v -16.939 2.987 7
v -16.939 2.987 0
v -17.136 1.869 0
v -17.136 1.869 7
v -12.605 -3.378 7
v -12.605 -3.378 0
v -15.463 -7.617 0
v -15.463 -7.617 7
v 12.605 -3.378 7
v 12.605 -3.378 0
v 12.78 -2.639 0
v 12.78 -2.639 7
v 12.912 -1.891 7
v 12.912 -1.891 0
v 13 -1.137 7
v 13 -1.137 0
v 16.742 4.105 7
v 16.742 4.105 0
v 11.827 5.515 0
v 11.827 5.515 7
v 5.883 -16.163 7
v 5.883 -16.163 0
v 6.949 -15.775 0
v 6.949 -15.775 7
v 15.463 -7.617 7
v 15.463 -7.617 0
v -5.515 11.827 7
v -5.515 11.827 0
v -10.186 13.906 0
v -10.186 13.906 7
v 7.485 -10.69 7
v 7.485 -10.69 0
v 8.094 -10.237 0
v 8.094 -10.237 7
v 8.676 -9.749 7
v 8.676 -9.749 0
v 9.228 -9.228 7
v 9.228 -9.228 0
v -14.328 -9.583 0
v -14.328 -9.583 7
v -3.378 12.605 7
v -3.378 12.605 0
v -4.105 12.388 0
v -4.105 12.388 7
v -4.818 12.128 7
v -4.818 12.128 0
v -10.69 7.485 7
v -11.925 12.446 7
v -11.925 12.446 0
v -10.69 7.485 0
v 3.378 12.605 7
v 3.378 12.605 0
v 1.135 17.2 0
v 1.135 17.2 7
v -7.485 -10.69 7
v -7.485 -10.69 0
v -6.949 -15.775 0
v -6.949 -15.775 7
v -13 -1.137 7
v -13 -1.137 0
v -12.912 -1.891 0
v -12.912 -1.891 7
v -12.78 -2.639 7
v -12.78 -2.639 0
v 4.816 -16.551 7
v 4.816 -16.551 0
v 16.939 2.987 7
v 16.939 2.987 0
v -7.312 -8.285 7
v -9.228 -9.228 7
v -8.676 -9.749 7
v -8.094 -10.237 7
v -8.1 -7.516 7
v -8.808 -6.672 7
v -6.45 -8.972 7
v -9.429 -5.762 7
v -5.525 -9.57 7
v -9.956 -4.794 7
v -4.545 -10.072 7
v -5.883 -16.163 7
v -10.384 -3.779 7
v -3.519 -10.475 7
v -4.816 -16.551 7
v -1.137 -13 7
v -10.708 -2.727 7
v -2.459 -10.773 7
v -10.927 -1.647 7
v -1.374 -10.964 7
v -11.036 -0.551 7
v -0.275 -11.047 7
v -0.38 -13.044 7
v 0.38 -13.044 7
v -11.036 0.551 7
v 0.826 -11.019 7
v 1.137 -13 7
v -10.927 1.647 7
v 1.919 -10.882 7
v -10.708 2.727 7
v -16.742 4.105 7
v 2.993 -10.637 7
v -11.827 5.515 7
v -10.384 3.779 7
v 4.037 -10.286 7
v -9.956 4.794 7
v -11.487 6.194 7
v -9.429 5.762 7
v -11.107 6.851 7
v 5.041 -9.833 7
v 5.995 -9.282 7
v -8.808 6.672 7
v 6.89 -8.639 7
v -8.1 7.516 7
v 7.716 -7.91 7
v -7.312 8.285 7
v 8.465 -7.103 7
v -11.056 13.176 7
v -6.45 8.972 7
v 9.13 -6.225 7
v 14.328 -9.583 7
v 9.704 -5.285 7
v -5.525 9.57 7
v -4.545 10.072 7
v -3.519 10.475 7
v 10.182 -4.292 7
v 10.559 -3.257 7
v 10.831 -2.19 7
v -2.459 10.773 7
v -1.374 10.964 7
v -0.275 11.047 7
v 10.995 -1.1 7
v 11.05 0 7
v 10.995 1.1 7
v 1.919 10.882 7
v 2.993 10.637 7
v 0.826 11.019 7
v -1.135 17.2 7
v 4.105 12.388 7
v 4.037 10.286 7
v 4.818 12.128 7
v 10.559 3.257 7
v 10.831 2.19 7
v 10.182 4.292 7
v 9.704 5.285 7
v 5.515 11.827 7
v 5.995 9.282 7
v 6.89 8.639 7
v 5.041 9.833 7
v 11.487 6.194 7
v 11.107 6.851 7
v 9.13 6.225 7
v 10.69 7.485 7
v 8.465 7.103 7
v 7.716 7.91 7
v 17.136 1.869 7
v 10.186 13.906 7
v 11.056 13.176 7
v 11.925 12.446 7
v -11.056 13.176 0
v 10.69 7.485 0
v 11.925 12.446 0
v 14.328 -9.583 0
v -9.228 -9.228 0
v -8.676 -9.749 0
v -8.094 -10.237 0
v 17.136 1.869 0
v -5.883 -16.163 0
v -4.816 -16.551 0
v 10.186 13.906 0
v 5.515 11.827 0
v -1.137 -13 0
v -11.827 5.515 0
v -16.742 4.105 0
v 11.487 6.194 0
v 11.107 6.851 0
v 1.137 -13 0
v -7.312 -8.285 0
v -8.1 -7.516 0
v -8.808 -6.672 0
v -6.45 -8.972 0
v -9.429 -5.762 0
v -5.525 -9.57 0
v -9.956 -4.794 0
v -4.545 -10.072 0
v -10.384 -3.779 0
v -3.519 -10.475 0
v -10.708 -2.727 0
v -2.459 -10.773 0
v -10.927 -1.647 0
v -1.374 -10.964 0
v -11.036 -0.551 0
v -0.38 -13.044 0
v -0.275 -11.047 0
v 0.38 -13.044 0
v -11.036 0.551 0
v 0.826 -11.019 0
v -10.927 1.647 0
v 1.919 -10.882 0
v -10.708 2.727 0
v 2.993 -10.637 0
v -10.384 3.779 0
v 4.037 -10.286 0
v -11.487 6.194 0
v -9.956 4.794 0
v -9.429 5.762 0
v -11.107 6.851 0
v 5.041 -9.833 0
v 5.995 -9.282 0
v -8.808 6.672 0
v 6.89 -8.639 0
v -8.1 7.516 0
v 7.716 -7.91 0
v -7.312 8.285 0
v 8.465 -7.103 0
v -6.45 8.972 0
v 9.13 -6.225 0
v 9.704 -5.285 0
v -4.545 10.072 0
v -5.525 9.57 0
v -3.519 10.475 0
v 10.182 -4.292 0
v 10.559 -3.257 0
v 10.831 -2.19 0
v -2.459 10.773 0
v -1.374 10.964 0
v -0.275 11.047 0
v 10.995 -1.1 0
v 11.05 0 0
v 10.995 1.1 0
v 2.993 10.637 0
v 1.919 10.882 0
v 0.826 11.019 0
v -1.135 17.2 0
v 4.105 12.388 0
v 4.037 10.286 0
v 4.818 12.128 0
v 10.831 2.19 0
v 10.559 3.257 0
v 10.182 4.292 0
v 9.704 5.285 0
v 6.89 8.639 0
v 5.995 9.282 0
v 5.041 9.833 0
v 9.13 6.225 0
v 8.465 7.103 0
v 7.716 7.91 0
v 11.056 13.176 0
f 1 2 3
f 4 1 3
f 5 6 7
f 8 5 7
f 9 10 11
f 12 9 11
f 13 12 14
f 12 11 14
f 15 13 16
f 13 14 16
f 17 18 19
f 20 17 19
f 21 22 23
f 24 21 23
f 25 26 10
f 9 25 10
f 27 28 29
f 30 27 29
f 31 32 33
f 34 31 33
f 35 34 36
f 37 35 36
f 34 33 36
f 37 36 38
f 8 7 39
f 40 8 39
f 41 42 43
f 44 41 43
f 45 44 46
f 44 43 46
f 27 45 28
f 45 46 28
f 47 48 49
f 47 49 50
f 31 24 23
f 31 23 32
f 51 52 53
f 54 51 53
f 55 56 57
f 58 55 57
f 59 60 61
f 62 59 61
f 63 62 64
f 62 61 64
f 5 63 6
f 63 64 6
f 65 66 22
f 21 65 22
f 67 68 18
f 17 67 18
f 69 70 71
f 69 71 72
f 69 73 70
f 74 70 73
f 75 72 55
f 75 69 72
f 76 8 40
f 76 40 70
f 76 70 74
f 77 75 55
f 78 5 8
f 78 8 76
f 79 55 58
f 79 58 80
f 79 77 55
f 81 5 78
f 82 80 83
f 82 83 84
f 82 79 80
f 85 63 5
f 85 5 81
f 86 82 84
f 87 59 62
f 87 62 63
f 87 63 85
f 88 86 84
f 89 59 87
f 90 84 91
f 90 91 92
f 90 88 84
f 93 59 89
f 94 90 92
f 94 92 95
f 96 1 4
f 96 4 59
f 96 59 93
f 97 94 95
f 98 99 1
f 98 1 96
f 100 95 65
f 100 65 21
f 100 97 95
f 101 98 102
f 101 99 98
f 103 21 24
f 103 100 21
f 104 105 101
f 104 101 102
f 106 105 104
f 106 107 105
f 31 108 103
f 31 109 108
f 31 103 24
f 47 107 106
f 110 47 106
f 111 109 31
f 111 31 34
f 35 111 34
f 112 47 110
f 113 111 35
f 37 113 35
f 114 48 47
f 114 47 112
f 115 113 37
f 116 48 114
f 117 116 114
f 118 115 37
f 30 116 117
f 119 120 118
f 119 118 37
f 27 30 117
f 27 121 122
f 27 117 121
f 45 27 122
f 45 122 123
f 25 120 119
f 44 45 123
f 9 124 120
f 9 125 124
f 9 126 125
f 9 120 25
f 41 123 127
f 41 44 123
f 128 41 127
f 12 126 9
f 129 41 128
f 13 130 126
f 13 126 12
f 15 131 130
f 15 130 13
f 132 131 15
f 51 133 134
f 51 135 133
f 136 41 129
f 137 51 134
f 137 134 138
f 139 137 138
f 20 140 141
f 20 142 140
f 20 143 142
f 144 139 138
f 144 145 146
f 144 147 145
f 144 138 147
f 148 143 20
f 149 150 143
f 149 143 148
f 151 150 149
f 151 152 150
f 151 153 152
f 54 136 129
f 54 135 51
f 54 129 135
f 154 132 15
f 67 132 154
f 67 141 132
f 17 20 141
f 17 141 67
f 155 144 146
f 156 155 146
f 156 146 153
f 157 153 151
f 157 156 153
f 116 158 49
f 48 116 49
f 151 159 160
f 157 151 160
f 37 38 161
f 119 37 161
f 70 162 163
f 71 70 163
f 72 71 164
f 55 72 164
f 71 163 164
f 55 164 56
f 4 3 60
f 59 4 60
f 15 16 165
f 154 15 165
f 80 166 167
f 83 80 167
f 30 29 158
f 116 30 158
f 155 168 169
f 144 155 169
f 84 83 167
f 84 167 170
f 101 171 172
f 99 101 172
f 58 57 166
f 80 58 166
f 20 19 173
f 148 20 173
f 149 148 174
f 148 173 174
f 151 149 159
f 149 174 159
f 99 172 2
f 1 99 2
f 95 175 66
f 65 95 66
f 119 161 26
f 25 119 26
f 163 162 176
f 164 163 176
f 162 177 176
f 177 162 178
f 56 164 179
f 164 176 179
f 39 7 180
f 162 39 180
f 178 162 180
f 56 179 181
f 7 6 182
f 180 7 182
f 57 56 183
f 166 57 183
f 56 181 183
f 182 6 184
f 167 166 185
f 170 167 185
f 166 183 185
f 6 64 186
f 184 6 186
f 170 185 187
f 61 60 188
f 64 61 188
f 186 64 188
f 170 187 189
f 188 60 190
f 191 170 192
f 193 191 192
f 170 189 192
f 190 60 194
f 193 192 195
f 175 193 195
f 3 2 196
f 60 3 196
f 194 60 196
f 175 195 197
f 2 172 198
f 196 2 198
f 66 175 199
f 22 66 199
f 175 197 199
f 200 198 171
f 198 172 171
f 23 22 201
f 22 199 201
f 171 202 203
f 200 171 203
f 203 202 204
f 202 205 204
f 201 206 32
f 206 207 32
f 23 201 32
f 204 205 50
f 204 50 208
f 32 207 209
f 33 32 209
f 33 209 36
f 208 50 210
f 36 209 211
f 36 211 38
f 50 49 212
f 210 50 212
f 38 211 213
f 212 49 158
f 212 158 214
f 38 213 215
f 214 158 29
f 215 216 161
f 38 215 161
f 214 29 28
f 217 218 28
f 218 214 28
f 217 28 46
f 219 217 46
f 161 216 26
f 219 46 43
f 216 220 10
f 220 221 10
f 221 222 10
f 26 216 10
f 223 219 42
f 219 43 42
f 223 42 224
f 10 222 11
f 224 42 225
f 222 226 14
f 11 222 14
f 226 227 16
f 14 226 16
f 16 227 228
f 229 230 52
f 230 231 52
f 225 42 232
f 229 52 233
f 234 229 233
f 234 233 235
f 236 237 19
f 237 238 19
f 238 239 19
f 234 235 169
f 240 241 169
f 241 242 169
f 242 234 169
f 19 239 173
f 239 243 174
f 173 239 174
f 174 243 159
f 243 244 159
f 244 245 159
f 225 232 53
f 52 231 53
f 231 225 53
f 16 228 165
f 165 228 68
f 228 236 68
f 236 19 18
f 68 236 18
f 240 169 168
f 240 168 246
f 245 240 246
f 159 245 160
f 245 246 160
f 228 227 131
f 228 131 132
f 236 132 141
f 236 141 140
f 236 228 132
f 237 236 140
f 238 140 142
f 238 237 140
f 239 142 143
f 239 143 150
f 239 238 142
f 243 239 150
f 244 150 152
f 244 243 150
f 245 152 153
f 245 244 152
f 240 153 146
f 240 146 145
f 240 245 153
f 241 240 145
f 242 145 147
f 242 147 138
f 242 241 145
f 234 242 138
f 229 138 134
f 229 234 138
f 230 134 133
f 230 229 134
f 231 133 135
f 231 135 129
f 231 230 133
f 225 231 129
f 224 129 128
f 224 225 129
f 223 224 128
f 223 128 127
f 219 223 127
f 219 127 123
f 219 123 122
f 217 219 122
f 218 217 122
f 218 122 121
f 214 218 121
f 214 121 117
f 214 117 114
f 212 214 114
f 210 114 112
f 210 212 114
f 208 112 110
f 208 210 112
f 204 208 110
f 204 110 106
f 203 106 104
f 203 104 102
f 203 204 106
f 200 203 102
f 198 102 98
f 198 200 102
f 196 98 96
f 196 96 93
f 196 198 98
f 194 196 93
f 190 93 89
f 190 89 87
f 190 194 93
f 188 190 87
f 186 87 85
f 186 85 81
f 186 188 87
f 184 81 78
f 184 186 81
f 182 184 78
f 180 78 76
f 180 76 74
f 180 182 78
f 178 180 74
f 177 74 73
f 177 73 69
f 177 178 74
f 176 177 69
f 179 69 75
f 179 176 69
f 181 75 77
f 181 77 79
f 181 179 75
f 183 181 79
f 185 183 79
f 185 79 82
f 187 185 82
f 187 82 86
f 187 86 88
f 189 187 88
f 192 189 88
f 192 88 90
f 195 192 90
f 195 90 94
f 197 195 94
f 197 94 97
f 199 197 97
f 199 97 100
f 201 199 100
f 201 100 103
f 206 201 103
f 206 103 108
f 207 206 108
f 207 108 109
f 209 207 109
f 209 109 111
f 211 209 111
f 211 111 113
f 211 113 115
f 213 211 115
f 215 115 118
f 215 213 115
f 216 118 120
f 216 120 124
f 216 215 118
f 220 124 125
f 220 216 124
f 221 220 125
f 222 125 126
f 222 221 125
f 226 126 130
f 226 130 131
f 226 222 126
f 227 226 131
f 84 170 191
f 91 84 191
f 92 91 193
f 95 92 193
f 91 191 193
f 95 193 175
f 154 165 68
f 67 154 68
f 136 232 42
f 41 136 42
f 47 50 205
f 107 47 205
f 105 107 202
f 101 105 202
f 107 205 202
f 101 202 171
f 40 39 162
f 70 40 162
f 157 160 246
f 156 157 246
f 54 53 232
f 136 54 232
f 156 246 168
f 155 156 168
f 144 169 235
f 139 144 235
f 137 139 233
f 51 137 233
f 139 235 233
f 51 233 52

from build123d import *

# Parameters (mm, degrees)
F0_R     = 11.05
F1_DEPTH = 7


with BuildPart() as f1:
    # F0 (on Top) → F1 (new body)
    with BuildSketch(Plane.XY):
        with BuildLine():
            ThreePointArc((-3.377589, 12.605332), (0, 13.05), (3.377589, 12.605332))
            Line((3.377589, 12.605332), (1.135, 17.2))
            Line((1.135, 17.2), (0, 17.2))
            Line((0, 17.2), (-1.135, 17.2))
            Line((-1.135, 17.2), (-3.377589, 12.605332))
        make_face()
        with BuildLine():
            ThreePointArc((13.000341, -1.137382), (13.037579, -0.569233), (13.05, 0))
            ThreePointArc((13.05, 0), (12.740663, 2.824537), (11.827317, 5.515168))
            ThreePointArc((11.827317, 5.515168), (11.301632, 6.525), (10.689934, 7.485172))
            ThreePointArc((10.689934, 7.485172), (8.388378, 9.99688), (5.515168, 11.827317))
            ThreePointArc((5.515168, 11.827317), (4.463363, 12.262989), (3.377589, 12.605332))
            ThreePointArc((3.377589, 12.605332), (0, 13.05), (-3.377589, 12.605332))
            ThreePointArc((-3.377589, 12.605332), (-4.463363, 12.262989), (-5.515168, 11.827317))
            ThreePointArc((-5.515168, 11.827317), (-8.388378, 9.99688), (-10.689934, 7.485172))
            ThreePointArc((-10.689934, 7.485172), (-11.301632, 6.525), (-11.827317, 5.515168))
            ThreePointArc((-11.827317, 5.515168), (-12.851741, 2.266109), (-13.000341, -1.137382))
            ThreePointArc((-13.000341, -1.137382), (-12.851741, -2.266109), (-12.605332, -3.377589))
            ThreePointArc((-12.605332, -3.377589), (-11.301632, -6.525), (-9.227743, -9.227743))
            ThreePointArc((-9.227743, -9.227743), (-8.388378, -9.99688), (-7.485172, -10.689934))
            ThreePointArc((-7.485172, -10.689934), (-4.463363, -12.262989), (-1.137382, -13.000341))
            ThreePointArc((-1.137382, -13.000341), (0, -13.05), (1.137382, -13.000341))
            ThreePointArc((1.137382, -13.000341), (4.463363, -12.262989), (7.485172, -10.689934))
            ThreePointArc((7.485172, -10.689934), (8.388378, -9.99688), (9.227743, -9.227743))
            ThreePointArc((9.227743, -9.227743), (11.301632, -6.525), (12.605332, -3.377589))
            ThreePointArc((12.605332, -3.377589), (12.851741, -2.266109), (13.000341, -1.137382))
        make_face()
        Circle(F0_R, mode=Mode.SUBTRACT)
        with BuildLine():
            ThreePointArc((5.515168, 11.827317), (8.388378, 9.99688), (10.689934, 7.485172))
            Line((10.689934, 7.485172), (11.925407, 12.4464))
            Line((11.925407, 12.4464), (11.055947, 13.175964))
            Line((11.055947, 13.175964), (10.186486, 13.905528))
            Line((10.186486, 13.905528), (5.515168, 11.827317))
        make_face()
        with BuildLine():
            ThreePointArc((11.827317, 5.515168), (12.740663, 2.824537), (13.05, 0))
            ThreePointArc((13.05, 0), (13.037579, -0.569233), (13.000341, -1.137382))
            Line((13.000341, -1.137382), (17.135784, 1.868992))
            Line((17.135784, 1.868992), (16.938693, 2.986749))
            Line((16.938693, 2.986749), (16.741603, 4.104505))
            Line((16.741603, 4.104505), (11.827317, 5.515168))
        make_face()
        with BuildLine():
            Line((15.463137, -7.617061), (12.605332, -3.377589))
            ThreePointArc((12.605332, -3.377589), (11.301632, -6.525), (9.227743, -9.227743))
            Line((9.227743, -9.227743), (14.328137, -9.582939))
            Line((14.328137, -9.582939), (14.895637, -8.6))
            Line((14.895637, -8.6), (15.463137, -7.617061))
        make_face()
        with BuildLine():
            Line((6.949298, -15.77452), (7.485172, -10.689934))
            ThreePointArc((7.485172, -10.689934), (4.463363, -12.262989), (1.137382, -13.000341))
            Line((1.137382, -13.000341), (4.816195, -16.550906))
            Line((4.816195, -16.550906), (5.882746, -16.162713))
            Line((5.882746, -16.162713), (6.949298, -15.77452))
        make_face()
        with BuildLine():
            Line((-4.816195, -16.550906), (-1.137382, -13.000341))
            ThreePointArc((-1.137382, -13.000341), (-4.463363, -12.262989), (-7.485172, -10.689934))
            Line((-7.485172, -10.689934), (-6.949298, -15.77452))
            Line((-6.949298, -15.77452), (-5.882746, -16.162713))
            Line((-5.882746, -16.162713), (-4.816195, -16.550906))
        make_face()
        with BuildLine():
            Line((-14.328137, -9.582939), (-9.227743, -9.227743))
            ThreePointArc((-9.227743, -9.227743), (-11.301632, -6.525), (-12.605332, -3.377589))
            Line((-12.605332, -3.377589), (-15.463137, -7.617061))
            Line((-15.463137, -7.617061), (-14.895637, -8.6))
            Line((-14.895637, -8.6), (-14.328137, -9.582939))
        make_face()
        with BuildLine():
            ThreePointArc((-13.000341, -1.137382), (-12.851741, 2.266109), (-11.827317, 5.515168))
            Line((-11.827317, 5.515168), (-16.741603, 4.104505))
            Line((-16.741603, 4.104505), (-16.938693, 2.986749))
            Line((-16.938693, 2.986749), (-17.135784, 1.868992))
            Line((-17.135784, 1.868992), (-13.000341, -1.137382))
        make_face()
        with BuildLine():
            ThreePointArc((-10.689934, 7.485172), (-8.388378, 9.99688), (-5.515168, 11.827317))
            Line((-5.515168, 11.827317), (-10.186486, 13.905528))
            Line((-10.186486, 13.905528), (-11.055947, 13.175964))
            Line((-11.055947, 13.175964), (-11.925407, 12.4464))
            Line((-11.925407, 12.4464), (-10.689934, 7.485172))
        make_face()
    extrude(amount=F1_DEPTH)


solid = f1.part
